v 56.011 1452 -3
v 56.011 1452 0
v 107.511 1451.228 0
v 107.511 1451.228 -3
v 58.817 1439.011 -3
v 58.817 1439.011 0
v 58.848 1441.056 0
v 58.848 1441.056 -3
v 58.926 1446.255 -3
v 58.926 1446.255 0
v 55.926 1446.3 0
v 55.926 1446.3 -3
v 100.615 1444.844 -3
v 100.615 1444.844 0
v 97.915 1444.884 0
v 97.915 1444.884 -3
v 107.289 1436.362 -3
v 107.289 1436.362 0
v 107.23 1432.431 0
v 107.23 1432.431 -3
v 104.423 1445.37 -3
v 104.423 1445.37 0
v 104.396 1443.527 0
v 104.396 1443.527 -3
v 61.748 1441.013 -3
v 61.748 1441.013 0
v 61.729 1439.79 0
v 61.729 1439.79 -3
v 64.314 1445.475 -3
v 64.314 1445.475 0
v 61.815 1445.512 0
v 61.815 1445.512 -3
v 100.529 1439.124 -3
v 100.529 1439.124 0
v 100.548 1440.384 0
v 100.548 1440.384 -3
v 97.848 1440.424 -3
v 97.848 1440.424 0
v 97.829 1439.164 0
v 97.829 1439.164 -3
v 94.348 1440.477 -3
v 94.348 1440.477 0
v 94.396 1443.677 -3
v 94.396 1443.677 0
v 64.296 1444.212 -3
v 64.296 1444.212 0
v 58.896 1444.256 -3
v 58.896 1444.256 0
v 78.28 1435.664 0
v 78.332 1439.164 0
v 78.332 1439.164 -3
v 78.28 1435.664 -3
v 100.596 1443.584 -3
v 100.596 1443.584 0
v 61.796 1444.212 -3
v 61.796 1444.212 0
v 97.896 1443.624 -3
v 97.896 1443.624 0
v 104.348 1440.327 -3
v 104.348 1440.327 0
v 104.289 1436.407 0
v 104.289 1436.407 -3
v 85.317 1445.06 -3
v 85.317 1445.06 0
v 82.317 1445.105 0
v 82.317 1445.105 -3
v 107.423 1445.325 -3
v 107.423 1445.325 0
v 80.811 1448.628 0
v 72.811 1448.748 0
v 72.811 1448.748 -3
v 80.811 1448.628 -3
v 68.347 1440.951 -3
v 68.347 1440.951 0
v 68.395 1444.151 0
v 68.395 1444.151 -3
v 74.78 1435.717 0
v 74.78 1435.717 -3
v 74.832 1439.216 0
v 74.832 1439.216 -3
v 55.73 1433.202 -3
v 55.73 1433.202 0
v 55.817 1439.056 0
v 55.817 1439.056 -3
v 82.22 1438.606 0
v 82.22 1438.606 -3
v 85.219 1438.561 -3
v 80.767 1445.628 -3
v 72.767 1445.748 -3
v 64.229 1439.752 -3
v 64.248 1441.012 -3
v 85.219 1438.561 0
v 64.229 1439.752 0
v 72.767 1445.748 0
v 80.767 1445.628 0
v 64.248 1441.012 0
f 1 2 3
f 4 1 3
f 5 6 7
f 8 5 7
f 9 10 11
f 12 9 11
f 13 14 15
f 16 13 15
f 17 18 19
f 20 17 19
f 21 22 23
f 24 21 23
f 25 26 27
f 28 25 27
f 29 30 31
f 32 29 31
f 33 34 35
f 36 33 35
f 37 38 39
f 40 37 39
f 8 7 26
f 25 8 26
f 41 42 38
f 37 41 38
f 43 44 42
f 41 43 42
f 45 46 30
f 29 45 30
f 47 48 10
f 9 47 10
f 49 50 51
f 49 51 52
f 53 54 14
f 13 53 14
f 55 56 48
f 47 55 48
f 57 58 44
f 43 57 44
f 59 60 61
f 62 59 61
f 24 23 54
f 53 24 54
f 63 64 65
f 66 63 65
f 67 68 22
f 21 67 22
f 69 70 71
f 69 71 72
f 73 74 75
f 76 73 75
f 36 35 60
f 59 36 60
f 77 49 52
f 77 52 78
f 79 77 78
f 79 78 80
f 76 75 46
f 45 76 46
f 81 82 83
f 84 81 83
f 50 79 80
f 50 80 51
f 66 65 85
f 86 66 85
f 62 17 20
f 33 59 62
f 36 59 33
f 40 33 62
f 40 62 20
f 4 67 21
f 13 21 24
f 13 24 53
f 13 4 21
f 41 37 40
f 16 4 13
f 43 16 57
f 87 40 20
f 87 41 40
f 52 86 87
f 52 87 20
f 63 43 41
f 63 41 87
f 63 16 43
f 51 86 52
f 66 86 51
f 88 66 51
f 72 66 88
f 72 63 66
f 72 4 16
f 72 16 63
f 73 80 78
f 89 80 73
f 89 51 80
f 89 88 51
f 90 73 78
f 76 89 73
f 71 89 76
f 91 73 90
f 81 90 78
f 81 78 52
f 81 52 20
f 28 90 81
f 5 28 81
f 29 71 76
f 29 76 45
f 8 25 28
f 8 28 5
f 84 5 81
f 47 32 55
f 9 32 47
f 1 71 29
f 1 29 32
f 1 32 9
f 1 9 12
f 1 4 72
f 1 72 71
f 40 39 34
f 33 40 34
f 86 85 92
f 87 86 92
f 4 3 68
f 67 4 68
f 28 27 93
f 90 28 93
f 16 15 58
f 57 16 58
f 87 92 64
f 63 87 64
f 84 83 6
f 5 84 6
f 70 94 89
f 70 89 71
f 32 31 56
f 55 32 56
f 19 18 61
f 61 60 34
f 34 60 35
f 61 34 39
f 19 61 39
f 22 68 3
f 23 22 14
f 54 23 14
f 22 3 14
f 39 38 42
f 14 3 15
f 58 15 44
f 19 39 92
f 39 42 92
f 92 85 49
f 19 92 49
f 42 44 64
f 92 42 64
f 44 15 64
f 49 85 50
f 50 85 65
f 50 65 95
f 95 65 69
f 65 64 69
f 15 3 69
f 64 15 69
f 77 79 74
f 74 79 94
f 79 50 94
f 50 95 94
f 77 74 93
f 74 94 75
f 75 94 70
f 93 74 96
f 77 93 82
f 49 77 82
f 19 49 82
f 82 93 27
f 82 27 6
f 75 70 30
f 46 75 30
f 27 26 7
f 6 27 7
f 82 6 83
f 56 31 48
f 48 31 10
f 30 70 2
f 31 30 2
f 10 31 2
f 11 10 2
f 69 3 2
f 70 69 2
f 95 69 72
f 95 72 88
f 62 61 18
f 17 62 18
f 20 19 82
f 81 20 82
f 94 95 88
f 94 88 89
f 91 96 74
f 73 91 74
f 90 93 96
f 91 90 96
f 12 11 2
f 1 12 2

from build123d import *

# Parameters (mm, degrees)
T_LE_DE_BASE_PLI_E1_DEPTH = 3


# Sheet-metal steps are written as plain solids
with BuildPart() as part:
    # Esquisse1 → Tôle de base pliée1 (new body)
    with BuildSketch(Plane.XY):
        Polygon((56.011486003, 1451.999694839), (107.511486003, 1451.228417484), (107.423076338, 1445.325096569), (104.423412714, 1445.370020309), (104.395809304, 1443.526875799), (100.595809304, 1443.583785584), (100.614677274, 1444.843644306), (97.914677274, 1444.884080206), (97.895809304, 1443.624221484), (94.395809304, 1443.676638392), (94.347885274, 1440.476638392), (97.847885274, 1440.424221484), (97.829017303, 1439.164362762), (100.529017303, 1439.123926862), (100.547885274, 1440.383785584), (104.347885274, 1440.326875799), (104.289178337, 1436.406875799), (107.289178337, 1436.361947021), (107.230300273, 1432.430520402), (55.729627521, 1433.201807832), (55.81730132, 1439.055993264), (58.81730132, 1439.011064486), (58.847926704, 1441.055993264), (61.74760154, 1441.012566982), (61.729288791, 1439.789781712), (64.228728196, 1439.752349459), (64.247596167, 1441.012208181), (68.347416735, 1440.950808205), (68.395340765, 1444.150808205), (64.295520197, 1444.212208181), (64.314426556, 1445.474630165), (61.814987151, 1445.512062418), (61.795520197, 1444.212208181), (58.89584536, 1444.255634463), (58.92579452, 1446.255410213), (55.926130896, 1446.300333953), align=None)
        Polygon((72.811486003, 1448.747757268), (80.811486003, 1448.627947194), (80.766562262, 1445.62828357), (72.766562262, 1445.748093644), align=None, mode=Mode.SUBTRACT)
        Polygon((82.316965577, 1445.105008259), (82.219630807, 1438.605737073), (85.219294431, 1438.560813333), (85.316629201, 1445.060084519), align=None, mode=Mode.SUBTRACT)
        Polygon((74.832038551, 1439.21643164), (78.332038551, 1439.164014732), (78.279627521, 1435.664407171), (74.779627521, 1435.716824078), align=None, mode=Mode.SUBTRACT)
    extrude(amount=-T_LE_DE_BASE_PLI_E1_DEPTH)


solid = part.part
